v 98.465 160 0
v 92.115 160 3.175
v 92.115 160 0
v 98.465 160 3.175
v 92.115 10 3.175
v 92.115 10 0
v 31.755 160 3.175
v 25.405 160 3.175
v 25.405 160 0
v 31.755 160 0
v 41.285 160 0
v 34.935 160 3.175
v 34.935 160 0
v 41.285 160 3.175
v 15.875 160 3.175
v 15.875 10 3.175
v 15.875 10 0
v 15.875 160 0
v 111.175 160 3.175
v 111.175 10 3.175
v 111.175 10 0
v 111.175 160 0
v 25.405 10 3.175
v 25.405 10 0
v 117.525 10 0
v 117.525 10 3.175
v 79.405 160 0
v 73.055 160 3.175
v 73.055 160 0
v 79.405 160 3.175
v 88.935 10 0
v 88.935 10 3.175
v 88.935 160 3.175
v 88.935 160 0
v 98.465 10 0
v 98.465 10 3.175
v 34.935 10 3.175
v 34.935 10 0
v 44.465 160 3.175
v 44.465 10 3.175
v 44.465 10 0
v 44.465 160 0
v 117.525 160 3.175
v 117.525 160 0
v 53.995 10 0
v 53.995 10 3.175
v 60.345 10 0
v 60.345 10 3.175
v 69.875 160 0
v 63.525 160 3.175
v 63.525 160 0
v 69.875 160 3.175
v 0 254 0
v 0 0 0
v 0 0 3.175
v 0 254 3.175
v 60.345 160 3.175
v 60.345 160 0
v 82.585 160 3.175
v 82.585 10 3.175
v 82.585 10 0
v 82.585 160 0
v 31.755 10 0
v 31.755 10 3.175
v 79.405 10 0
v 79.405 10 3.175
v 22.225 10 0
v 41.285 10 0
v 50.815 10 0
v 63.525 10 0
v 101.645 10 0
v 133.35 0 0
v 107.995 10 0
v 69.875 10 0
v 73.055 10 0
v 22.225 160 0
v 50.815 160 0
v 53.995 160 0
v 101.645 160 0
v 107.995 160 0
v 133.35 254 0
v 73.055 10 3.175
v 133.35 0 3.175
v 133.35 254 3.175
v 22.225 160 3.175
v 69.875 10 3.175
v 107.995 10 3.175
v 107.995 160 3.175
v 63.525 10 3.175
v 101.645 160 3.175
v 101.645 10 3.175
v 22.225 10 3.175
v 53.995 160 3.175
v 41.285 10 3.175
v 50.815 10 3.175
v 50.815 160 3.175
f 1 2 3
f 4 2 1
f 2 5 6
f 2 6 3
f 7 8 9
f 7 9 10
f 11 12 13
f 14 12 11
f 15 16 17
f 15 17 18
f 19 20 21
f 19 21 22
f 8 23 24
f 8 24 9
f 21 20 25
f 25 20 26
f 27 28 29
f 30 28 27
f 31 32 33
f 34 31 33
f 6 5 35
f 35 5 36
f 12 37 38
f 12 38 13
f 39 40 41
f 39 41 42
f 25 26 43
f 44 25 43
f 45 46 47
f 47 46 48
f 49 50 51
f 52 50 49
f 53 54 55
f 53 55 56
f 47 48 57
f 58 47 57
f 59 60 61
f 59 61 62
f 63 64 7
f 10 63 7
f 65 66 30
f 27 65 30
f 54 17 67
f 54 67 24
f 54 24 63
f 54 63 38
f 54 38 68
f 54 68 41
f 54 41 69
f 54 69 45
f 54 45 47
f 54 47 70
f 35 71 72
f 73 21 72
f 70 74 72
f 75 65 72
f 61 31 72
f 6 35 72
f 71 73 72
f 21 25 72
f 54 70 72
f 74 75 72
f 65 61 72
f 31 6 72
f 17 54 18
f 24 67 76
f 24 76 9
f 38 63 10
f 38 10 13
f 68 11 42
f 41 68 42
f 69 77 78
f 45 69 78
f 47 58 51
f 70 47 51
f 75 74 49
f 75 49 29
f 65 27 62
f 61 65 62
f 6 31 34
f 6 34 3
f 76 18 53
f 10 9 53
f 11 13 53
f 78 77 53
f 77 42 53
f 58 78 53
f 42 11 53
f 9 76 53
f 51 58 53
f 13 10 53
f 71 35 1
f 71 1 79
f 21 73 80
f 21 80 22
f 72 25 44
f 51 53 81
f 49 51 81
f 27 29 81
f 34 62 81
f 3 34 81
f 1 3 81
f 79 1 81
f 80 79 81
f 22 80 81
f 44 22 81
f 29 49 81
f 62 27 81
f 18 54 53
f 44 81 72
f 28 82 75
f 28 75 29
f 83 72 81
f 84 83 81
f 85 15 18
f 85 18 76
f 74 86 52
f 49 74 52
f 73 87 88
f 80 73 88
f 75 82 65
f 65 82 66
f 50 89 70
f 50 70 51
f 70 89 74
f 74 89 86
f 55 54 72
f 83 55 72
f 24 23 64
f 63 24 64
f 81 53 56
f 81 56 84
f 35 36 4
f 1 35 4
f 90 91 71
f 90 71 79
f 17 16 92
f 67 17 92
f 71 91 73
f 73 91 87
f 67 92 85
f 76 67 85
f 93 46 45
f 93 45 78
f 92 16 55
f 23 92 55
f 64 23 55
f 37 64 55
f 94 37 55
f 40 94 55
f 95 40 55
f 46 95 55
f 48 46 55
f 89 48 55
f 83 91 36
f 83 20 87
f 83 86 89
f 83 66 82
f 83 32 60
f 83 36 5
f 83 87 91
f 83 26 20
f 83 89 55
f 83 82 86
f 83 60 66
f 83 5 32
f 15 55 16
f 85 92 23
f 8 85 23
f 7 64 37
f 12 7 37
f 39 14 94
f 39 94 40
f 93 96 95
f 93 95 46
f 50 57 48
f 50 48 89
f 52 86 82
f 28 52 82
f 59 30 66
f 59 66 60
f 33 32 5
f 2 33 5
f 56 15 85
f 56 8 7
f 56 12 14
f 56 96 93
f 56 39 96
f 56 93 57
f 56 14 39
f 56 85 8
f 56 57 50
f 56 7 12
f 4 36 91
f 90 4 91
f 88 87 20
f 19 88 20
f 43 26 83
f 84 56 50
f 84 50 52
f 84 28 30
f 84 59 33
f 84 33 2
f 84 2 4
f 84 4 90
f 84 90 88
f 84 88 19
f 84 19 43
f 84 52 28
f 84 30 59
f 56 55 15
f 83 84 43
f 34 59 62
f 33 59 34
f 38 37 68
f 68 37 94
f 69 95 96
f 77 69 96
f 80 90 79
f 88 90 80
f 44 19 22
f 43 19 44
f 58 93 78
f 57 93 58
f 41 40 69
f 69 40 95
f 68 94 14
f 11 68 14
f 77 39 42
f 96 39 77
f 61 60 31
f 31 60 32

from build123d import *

# Parameters (mm, degrees)
SKETCH1_W           = 133.35
SKETCH1_H           = 254
BOSS_EXTRUDE1_DEPTH = 3.175
SKETCH2_W           = 6.35
SKETCH2_H           = 150
CUT_EXTRUDE1_DEPTH  = 3.175


with BuildPart() as part:
    # Sketch1 → Boss-Extrude1 (new body)
    with BuildSketch(Plane.XY):
        with Locations((66.675, 127)):
            Rectangle(SKETCH1_W, SKETCH1_H)
    extrude(amount=BOSS_EXTRUDE1_DEPTH)

    # Sketch2 → Cut-Extrude1 (cut)
    with BuildSketch(Plane.XY.offset(3.175)):
        with Locations((19.05, 85)):
            Rectangle(SKETCH2_W, SKETCH2_H)
        with Locations((28.58, 85)):
            Rectangle(SKETCH2_W, SKETCH2_H)
        with Locations((38.11, 85)):
            Rectangle(SKETCH2_W, SKETCH2_H)
        with Locations((47.64, 85)):
            Rectangle(SKETCH2_W, SKETCH2_H)
        with Locations((57.17, 85)):
            Rectangle(SKETCH2_W, SKETCH2_H)
        with Locations((66.7, 85)):
            Rectangle(SKETCH2_W, SKETCH2_H)
        with Locations((76.23, 85)):
            Rectangle(SKETCH2_W, SKETCH2_H)
        with Locations((85.76, 85)):
            Rectangle(SKETCH2_W, SKETCH2_H)
        with Locations((95.29, 85)):
            Rectangle(SKETCH2_W, SKETCH2_H)
        with Locations((104.82, 85)):
            Rectangle(SKETCH2_W, SKETCH2_H)
        with Locations((114.35, 85)):
            Rectangle(SKETCH2_W, SKETCH2_H)
    extrude(amount=-CUT_EXTRUDE1_DEPTH, mode=Mode.SUBTRACT)


solid = part.part
